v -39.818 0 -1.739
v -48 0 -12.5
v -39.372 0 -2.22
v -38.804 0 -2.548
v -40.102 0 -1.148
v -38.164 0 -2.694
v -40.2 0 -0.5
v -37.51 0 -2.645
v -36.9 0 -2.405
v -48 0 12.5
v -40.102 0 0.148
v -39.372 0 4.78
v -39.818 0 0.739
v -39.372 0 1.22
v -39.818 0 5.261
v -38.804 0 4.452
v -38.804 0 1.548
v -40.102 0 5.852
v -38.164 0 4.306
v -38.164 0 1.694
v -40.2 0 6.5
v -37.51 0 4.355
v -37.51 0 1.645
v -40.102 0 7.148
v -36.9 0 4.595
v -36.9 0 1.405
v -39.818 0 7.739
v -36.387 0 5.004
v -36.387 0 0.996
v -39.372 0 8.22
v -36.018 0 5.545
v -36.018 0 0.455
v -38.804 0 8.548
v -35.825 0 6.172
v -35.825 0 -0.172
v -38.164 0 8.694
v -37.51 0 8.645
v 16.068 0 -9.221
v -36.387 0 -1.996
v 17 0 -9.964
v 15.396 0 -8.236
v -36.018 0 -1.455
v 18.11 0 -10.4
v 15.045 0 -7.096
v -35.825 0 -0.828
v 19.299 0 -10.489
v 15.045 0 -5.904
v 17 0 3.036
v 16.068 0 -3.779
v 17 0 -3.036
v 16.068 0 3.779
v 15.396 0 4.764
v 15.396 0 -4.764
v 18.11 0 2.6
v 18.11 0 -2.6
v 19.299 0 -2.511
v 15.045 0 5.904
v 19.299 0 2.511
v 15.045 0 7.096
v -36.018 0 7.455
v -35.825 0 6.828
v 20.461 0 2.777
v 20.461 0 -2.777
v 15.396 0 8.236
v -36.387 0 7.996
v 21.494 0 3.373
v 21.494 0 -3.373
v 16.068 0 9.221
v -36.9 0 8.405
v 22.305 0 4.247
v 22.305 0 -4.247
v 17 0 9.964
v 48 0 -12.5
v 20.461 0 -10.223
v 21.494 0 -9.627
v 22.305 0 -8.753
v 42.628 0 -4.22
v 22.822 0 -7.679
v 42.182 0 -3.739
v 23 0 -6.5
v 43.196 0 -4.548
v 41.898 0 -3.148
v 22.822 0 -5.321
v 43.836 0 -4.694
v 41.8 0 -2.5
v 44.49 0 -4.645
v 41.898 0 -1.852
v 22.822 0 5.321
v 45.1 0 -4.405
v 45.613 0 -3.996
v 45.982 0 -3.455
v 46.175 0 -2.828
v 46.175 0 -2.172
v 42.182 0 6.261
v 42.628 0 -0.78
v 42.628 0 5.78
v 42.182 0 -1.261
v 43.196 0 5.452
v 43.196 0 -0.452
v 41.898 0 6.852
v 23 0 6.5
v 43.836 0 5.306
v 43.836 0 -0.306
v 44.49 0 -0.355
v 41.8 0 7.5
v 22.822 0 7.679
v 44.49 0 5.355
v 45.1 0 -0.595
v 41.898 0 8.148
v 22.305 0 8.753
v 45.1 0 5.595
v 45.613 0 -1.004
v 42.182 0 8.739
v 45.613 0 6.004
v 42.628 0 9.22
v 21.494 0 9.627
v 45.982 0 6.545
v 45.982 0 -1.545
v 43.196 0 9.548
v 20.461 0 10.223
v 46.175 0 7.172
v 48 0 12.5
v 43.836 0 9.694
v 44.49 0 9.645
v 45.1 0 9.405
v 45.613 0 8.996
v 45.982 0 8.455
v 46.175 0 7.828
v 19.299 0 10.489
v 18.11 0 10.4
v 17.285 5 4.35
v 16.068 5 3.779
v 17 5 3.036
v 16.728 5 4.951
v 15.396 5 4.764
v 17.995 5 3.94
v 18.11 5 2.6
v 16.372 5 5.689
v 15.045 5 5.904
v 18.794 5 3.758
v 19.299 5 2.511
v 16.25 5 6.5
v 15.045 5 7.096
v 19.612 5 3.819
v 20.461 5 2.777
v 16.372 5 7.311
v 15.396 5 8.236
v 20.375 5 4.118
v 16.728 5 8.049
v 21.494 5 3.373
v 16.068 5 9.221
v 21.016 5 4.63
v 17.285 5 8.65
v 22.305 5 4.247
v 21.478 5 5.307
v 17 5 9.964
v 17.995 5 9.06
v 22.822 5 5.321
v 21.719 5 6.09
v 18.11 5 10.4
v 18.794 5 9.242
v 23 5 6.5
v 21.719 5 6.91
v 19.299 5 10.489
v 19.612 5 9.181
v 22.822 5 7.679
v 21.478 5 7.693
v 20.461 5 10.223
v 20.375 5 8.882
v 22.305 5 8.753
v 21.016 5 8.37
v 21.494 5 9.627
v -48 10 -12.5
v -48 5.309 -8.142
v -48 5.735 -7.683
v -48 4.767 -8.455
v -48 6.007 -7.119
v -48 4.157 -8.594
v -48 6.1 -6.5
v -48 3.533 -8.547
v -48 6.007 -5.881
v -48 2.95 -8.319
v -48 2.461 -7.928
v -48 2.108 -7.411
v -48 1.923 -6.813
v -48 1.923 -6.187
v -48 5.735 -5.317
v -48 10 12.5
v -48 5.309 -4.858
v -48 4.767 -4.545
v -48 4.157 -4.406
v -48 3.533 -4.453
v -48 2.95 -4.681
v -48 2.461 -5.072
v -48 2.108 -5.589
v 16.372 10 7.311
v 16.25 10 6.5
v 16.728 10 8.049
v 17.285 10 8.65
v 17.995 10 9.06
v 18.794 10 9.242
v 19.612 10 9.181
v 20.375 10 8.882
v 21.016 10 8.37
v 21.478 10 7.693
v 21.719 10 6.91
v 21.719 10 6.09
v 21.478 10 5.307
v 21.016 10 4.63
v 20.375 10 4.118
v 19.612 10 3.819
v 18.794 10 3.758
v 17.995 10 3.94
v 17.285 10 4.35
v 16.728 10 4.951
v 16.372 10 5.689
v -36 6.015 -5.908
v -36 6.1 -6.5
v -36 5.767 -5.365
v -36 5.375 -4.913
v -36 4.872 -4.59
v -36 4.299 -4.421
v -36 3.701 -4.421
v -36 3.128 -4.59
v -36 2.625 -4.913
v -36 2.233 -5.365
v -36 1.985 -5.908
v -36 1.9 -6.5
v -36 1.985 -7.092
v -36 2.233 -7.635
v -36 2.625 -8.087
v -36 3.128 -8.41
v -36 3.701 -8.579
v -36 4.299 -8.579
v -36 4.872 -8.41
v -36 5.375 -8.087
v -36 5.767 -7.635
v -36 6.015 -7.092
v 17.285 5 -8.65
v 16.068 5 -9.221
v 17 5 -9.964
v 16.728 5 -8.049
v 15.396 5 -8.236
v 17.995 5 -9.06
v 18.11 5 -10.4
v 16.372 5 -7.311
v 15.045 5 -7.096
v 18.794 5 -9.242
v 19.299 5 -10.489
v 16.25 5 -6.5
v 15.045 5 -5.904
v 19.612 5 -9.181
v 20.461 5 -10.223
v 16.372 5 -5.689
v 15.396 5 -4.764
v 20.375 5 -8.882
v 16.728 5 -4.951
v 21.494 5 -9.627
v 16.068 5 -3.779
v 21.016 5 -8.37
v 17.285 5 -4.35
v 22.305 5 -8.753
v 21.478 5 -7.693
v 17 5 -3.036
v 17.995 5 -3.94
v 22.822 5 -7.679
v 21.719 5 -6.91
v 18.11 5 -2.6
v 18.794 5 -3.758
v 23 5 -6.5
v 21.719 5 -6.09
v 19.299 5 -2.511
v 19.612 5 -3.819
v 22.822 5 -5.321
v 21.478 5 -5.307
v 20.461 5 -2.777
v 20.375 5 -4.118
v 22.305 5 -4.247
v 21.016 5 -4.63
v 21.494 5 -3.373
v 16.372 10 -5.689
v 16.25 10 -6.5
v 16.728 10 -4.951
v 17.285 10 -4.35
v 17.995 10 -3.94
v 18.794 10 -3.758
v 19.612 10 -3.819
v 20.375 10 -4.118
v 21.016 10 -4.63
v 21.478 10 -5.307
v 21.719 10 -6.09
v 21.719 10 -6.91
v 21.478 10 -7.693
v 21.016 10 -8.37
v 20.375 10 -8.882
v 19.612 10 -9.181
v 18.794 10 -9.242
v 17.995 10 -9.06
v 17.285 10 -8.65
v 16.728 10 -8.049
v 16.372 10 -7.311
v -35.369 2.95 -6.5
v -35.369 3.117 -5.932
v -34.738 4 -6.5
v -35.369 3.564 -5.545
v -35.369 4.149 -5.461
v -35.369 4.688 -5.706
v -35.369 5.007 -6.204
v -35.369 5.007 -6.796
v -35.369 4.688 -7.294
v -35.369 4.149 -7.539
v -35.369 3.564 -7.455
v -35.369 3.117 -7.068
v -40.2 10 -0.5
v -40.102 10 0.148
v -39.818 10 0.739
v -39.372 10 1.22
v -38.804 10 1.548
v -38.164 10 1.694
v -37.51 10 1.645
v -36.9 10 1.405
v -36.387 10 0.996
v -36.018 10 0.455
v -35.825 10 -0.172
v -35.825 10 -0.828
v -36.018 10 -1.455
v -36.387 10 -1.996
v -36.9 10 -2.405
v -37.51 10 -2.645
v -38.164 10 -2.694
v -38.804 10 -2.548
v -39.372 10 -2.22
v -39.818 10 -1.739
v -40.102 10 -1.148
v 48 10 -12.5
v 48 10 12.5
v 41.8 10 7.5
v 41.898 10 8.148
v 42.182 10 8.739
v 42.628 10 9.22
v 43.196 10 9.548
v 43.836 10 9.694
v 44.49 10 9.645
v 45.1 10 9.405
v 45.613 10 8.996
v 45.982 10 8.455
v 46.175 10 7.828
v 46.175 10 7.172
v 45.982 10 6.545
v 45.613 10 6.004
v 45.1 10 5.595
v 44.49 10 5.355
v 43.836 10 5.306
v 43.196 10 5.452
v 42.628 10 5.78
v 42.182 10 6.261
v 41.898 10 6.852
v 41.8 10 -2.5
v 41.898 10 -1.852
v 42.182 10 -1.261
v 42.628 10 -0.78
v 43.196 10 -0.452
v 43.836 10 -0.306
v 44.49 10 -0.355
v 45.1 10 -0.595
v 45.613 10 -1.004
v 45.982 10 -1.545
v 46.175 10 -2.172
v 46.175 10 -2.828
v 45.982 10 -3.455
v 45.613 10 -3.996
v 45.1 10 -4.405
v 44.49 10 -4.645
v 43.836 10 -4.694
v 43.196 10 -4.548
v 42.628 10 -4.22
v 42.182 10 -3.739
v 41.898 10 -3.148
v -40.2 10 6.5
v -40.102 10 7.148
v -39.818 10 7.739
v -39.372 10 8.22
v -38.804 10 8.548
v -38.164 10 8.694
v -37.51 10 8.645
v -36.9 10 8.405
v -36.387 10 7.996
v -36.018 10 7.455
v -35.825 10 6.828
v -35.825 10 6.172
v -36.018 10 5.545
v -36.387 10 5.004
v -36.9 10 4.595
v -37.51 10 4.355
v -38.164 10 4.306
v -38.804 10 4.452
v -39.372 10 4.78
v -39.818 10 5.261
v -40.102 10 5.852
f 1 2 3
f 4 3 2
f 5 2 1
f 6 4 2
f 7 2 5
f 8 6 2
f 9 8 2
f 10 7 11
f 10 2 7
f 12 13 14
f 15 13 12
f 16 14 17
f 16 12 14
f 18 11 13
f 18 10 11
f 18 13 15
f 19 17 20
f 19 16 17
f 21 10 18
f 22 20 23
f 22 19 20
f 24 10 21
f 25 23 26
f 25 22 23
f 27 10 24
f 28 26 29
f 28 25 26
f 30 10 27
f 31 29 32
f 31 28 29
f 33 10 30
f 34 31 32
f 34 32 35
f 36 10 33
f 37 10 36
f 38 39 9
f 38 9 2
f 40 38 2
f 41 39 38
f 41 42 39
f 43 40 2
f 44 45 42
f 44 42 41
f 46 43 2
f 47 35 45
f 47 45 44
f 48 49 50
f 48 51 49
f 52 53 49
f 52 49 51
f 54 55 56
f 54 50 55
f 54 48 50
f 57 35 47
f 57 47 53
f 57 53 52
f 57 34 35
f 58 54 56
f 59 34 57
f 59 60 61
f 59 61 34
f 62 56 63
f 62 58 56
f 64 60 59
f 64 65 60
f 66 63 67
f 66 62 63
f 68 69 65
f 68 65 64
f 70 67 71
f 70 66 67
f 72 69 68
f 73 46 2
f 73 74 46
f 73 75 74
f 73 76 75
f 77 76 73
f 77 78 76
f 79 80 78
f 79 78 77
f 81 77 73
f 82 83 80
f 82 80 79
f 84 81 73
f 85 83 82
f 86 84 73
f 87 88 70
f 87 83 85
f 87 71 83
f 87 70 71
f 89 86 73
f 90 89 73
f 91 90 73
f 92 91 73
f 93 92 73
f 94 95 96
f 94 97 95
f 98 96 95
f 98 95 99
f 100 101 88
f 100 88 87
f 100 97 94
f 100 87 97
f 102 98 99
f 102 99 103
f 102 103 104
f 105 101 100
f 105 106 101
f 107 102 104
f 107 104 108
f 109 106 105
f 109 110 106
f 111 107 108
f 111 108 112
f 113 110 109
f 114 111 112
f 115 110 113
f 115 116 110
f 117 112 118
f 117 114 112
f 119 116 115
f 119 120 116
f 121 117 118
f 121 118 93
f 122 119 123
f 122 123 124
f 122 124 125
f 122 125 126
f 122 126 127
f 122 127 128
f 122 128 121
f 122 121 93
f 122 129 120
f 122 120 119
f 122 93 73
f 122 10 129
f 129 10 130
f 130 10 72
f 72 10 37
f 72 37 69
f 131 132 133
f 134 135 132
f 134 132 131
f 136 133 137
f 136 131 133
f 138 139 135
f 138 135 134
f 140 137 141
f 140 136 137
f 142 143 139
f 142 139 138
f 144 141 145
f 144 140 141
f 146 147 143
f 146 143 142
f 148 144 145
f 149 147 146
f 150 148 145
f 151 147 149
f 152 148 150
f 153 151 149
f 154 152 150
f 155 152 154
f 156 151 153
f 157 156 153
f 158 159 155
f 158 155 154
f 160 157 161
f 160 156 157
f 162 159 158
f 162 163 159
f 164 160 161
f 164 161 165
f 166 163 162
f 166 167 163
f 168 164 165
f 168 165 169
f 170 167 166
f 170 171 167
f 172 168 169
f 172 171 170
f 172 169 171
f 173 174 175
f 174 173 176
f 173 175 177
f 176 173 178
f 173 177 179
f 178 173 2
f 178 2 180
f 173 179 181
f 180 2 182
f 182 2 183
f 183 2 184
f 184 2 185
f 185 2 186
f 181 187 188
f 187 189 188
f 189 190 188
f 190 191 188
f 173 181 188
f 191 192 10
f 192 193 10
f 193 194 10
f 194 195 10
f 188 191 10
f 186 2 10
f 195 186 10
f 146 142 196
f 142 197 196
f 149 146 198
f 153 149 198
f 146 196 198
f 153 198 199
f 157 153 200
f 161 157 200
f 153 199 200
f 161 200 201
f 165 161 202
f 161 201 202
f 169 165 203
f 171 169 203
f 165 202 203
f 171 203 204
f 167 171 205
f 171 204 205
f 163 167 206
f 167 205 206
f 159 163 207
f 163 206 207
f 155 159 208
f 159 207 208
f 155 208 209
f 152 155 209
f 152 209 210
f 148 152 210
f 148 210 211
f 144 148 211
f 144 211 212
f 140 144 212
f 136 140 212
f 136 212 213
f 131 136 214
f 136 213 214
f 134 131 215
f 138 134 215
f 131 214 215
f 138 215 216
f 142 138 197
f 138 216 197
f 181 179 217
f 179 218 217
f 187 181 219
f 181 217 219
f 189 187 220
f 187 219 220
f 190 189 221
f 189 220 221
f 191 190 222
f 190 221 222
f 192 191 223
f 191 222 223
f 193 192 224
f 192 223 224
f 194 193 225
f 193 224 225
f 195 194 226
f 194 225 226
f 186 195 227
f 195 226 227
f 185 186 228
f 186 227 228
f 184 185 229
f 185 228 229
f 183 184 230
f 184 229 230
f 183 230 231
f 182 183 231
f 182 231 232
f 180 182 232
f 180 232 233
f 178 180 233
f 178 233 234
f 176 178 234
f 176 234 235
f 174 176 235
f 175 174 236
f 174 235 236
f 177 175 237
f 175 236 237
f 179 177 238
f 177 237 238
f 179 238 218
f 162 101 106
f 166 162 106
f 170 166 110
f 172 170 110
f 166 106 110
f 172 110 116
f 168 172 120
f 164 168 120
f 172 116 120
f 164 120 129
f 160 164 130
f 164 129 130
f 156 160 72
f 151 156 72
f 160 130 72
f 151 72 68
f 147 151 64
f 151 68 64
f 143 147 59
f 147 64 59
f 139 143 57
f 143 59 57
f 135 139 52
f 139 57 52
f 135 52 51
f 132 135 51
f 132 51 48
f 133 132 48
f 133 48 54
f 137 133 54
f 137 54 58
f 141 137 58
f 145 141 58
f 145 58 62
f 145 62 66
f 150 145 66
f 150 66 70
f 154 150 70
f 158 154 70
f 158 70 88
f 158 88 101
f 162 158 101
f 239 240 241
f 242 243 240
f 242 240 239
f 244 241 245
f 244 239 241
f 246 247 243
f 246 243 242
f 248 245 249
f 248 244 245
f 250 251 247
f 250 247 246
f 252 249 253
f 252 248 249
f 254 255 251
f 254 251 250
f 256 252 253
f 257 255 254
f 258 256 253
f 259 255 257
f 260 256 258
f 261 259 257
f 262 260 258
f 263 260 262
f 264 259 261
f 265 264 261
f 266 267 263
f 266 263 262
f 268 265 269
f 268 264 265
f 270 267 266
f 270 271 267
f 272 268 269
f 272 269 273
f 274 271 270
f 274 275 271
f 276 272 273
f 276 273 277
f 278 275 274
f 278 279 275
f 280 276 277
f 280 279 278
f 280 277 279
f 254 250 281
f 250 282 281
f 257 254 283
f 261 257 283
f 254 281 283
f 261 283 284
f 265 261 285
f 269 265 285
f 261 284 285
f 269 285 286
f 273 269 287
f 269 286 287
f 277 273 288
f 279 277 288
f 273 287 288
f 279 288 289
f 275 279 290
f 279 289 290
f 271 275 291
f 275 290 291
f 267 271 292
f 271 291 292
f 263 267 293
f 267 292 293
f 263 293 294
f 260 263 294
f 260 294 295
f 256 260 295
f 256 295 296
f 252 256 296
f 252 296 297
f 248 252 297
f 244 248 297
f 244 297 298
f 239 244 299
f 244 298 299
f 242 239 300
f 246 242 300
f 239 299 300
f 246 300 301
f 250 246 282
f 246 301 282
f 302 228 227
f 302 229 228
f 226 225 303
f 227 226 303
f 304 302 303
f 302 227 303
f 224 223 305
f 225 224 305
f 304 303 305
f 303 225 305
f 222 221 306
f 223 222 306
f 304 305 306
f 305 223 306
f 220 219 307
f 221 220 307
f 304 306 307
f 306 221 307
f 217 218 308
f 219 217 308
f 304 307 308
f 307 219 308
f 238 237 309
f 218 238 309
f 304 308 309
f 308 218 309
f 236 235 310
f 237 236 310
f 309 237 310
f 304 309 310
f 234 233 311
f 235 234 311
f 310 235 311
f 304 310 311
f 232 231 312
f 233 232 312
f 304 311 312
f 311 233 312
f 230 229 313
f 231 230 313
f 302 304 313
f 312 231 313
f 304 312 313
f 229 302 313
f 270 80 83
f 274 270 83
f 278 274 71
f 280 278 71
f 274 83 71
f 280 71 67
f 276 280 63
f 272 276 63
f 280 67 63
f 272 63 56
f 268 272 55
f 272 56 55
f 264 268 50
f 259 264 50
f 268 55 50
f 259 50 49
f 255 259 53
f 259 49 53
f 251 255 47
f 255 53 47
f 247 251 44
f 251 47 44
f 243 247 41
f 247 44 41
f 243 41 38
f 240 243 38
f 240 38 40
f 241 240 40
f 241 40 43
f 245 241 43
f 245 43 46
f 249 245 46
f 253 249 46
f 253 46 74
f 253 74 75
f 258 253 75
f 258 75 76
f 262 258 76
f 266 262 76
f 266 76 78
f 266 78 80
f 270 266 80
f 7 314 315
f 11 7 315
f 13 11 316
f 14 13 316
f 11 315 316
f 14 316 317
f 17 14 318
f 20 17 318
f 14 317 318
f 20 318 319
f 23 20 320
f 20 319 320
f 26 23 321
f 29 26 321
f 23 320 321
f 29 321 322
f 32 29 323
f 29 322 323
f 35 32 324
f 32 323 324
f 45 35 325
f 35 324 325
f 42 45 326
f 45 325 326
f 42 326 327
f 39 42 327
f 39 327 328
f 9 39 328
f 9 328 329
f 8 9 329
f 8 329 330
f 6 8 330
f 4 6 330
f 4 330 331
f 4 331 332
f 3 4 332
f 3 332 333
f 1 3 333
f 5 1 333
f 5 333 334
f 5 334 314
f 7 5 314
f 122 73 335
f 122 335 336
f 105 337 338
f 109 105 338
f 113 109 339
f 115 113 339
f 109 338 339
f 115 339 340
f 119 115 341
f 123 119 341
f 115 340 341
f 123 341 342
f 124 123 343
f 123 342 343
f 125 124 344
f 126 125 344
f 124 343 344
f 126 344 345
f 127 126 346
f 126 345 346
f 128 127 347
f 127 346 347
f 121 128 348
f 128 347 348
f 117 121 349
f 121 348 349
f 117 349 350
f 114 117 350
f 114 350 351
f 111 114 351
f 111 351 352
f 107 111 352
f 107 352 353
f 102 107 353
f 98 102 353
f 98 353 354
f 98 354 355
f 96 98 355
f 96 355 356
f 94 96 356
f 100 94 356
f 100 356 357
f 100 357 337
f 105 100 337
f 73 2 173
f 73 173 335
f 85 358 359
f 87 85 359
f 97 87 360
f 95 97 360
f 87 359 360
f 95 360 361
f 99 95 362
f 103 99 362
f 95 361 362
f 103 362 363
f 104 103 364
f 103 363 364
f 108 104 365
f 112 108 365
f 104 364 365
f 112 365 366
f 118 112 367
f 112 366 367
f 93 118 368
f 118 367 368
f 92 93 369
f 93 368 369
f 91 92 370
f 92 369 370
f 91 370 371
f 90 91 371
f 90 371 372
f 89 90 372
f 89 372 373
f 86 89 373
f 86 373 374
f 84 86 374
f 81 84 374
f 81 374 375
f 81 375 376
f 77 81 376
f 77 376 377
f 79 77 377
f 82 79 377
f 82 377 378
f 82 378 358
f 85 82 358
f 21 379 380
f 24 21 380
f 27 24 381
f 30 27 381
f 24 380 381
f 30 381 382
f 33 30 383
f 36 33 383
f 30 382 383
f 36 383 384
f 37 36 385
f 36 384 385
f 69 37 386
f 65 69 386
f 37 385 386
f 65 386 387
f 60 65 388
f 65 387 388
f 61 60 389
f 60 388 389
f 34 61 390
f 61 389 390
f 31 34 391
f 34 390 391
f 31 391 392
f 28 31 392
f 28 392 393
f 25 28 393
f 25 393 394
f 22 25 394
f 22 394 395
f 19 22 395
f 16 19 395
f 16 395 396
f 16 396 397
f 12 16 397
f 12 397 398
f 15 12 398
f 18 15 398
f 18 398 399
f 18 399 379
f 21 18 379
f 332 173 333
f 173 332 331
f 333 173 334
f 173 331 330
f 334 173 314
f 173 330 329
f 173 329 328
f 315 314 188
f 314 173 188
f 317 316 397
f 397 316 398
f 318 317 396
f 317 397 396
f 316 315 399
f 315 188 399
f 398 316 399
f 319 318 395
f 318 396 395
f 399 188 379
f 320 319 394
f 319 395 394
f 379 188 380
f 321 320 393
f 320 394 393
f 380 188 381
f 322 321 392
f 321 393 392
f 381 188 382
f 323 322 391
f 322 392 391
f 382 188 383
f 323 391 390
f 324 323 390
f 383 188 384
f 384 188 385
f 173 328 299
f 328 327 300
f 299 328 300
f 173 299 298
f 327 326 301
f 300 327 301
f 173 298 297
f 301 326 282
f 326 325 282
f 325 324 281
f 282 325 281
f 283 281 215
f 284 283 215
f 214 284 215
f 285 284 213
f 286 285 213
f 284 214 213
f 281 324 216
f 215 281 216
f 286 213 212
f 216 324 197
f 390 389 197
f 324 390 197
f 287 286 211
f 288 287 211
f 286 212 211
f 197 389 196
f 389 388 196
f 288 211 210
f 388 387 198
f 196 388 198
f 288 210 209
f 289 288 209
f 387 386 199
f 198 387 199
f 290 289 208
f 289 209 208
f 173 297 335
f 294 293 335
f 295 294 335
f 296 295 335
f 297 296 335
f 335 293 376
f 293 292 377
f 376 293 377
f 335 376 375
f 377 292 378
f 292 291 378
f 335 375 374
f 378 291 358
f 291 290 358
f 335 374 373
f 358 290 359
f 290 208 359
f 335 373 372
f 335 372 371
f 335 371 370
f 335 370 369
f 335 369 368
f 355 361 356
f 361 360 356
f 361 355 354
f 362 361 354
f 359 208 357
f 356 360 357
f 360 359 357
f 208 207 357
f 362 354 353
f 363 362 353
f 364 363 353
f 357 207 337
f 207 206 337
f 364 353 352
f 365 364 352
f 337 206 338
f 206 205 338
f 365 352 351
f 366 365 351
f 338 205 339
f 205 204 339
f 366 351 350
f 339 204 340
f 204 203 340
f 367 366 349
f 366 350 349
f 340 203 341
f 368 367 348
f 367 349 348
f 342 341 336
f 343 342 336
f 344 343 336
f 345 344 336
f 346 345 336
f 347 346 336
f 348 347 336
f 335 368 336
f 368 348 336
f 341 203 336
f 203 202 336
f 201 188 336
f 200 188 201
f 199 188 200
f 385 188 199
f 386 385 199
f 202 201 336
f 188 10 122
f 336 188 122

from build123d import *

# Parameters (mm, degrees)
F0_W           = 96
F0_H           = 25
F1_DEPTH       = 10
F2_D           = 5.5
F2_CBORE_D     = 8
F2_CBORE_DEPTH = 5
F3_D           = 4.4
F5_D           = 4.2
F5_DEPTH       = 12
F5_TIP         = 1.2618073


with BuildPart() as f1:
    # F0 (on Front) → F1 (new body)
    with BuildSketch(Plane.XZ):
        Rectangle(F0_W, F0_H)
    extrude(amount=-F1_DEPTH)

    # F2 (through all)
    with Locations(Plane.XZ):
        with Locations((19, 6.5), (19, -6.5)):
            CounterBoreHole(F2_D / 2, F2_CBORE_D / 2, F2_CBORE_DEPTH)

    # F3 (through all)
    with Locations(Plane.XZ):
        with Locations((44, 7.5), (44, -2.5), (-38, 6.5), (-38, -0.5)):
            Hole(F3_D / 2)

    # F5
    with Locations(Plane(origin=(-48, 0, 0), x_dir=(0, -1, 0), z_dir=(-1, 0, 0))):
        with Locations((-4, -6.5)):
            Hole(F5_D / 2, depth=F5_DEPTH)
            with Locations((0, 0, -(F5_DEPTH + F5_TIP / 2))):  # 118° drill point
                Cone(0, F5_D / 2, F5_TIP, mode=Mode.SUBTRACT)


solid = f1.part
